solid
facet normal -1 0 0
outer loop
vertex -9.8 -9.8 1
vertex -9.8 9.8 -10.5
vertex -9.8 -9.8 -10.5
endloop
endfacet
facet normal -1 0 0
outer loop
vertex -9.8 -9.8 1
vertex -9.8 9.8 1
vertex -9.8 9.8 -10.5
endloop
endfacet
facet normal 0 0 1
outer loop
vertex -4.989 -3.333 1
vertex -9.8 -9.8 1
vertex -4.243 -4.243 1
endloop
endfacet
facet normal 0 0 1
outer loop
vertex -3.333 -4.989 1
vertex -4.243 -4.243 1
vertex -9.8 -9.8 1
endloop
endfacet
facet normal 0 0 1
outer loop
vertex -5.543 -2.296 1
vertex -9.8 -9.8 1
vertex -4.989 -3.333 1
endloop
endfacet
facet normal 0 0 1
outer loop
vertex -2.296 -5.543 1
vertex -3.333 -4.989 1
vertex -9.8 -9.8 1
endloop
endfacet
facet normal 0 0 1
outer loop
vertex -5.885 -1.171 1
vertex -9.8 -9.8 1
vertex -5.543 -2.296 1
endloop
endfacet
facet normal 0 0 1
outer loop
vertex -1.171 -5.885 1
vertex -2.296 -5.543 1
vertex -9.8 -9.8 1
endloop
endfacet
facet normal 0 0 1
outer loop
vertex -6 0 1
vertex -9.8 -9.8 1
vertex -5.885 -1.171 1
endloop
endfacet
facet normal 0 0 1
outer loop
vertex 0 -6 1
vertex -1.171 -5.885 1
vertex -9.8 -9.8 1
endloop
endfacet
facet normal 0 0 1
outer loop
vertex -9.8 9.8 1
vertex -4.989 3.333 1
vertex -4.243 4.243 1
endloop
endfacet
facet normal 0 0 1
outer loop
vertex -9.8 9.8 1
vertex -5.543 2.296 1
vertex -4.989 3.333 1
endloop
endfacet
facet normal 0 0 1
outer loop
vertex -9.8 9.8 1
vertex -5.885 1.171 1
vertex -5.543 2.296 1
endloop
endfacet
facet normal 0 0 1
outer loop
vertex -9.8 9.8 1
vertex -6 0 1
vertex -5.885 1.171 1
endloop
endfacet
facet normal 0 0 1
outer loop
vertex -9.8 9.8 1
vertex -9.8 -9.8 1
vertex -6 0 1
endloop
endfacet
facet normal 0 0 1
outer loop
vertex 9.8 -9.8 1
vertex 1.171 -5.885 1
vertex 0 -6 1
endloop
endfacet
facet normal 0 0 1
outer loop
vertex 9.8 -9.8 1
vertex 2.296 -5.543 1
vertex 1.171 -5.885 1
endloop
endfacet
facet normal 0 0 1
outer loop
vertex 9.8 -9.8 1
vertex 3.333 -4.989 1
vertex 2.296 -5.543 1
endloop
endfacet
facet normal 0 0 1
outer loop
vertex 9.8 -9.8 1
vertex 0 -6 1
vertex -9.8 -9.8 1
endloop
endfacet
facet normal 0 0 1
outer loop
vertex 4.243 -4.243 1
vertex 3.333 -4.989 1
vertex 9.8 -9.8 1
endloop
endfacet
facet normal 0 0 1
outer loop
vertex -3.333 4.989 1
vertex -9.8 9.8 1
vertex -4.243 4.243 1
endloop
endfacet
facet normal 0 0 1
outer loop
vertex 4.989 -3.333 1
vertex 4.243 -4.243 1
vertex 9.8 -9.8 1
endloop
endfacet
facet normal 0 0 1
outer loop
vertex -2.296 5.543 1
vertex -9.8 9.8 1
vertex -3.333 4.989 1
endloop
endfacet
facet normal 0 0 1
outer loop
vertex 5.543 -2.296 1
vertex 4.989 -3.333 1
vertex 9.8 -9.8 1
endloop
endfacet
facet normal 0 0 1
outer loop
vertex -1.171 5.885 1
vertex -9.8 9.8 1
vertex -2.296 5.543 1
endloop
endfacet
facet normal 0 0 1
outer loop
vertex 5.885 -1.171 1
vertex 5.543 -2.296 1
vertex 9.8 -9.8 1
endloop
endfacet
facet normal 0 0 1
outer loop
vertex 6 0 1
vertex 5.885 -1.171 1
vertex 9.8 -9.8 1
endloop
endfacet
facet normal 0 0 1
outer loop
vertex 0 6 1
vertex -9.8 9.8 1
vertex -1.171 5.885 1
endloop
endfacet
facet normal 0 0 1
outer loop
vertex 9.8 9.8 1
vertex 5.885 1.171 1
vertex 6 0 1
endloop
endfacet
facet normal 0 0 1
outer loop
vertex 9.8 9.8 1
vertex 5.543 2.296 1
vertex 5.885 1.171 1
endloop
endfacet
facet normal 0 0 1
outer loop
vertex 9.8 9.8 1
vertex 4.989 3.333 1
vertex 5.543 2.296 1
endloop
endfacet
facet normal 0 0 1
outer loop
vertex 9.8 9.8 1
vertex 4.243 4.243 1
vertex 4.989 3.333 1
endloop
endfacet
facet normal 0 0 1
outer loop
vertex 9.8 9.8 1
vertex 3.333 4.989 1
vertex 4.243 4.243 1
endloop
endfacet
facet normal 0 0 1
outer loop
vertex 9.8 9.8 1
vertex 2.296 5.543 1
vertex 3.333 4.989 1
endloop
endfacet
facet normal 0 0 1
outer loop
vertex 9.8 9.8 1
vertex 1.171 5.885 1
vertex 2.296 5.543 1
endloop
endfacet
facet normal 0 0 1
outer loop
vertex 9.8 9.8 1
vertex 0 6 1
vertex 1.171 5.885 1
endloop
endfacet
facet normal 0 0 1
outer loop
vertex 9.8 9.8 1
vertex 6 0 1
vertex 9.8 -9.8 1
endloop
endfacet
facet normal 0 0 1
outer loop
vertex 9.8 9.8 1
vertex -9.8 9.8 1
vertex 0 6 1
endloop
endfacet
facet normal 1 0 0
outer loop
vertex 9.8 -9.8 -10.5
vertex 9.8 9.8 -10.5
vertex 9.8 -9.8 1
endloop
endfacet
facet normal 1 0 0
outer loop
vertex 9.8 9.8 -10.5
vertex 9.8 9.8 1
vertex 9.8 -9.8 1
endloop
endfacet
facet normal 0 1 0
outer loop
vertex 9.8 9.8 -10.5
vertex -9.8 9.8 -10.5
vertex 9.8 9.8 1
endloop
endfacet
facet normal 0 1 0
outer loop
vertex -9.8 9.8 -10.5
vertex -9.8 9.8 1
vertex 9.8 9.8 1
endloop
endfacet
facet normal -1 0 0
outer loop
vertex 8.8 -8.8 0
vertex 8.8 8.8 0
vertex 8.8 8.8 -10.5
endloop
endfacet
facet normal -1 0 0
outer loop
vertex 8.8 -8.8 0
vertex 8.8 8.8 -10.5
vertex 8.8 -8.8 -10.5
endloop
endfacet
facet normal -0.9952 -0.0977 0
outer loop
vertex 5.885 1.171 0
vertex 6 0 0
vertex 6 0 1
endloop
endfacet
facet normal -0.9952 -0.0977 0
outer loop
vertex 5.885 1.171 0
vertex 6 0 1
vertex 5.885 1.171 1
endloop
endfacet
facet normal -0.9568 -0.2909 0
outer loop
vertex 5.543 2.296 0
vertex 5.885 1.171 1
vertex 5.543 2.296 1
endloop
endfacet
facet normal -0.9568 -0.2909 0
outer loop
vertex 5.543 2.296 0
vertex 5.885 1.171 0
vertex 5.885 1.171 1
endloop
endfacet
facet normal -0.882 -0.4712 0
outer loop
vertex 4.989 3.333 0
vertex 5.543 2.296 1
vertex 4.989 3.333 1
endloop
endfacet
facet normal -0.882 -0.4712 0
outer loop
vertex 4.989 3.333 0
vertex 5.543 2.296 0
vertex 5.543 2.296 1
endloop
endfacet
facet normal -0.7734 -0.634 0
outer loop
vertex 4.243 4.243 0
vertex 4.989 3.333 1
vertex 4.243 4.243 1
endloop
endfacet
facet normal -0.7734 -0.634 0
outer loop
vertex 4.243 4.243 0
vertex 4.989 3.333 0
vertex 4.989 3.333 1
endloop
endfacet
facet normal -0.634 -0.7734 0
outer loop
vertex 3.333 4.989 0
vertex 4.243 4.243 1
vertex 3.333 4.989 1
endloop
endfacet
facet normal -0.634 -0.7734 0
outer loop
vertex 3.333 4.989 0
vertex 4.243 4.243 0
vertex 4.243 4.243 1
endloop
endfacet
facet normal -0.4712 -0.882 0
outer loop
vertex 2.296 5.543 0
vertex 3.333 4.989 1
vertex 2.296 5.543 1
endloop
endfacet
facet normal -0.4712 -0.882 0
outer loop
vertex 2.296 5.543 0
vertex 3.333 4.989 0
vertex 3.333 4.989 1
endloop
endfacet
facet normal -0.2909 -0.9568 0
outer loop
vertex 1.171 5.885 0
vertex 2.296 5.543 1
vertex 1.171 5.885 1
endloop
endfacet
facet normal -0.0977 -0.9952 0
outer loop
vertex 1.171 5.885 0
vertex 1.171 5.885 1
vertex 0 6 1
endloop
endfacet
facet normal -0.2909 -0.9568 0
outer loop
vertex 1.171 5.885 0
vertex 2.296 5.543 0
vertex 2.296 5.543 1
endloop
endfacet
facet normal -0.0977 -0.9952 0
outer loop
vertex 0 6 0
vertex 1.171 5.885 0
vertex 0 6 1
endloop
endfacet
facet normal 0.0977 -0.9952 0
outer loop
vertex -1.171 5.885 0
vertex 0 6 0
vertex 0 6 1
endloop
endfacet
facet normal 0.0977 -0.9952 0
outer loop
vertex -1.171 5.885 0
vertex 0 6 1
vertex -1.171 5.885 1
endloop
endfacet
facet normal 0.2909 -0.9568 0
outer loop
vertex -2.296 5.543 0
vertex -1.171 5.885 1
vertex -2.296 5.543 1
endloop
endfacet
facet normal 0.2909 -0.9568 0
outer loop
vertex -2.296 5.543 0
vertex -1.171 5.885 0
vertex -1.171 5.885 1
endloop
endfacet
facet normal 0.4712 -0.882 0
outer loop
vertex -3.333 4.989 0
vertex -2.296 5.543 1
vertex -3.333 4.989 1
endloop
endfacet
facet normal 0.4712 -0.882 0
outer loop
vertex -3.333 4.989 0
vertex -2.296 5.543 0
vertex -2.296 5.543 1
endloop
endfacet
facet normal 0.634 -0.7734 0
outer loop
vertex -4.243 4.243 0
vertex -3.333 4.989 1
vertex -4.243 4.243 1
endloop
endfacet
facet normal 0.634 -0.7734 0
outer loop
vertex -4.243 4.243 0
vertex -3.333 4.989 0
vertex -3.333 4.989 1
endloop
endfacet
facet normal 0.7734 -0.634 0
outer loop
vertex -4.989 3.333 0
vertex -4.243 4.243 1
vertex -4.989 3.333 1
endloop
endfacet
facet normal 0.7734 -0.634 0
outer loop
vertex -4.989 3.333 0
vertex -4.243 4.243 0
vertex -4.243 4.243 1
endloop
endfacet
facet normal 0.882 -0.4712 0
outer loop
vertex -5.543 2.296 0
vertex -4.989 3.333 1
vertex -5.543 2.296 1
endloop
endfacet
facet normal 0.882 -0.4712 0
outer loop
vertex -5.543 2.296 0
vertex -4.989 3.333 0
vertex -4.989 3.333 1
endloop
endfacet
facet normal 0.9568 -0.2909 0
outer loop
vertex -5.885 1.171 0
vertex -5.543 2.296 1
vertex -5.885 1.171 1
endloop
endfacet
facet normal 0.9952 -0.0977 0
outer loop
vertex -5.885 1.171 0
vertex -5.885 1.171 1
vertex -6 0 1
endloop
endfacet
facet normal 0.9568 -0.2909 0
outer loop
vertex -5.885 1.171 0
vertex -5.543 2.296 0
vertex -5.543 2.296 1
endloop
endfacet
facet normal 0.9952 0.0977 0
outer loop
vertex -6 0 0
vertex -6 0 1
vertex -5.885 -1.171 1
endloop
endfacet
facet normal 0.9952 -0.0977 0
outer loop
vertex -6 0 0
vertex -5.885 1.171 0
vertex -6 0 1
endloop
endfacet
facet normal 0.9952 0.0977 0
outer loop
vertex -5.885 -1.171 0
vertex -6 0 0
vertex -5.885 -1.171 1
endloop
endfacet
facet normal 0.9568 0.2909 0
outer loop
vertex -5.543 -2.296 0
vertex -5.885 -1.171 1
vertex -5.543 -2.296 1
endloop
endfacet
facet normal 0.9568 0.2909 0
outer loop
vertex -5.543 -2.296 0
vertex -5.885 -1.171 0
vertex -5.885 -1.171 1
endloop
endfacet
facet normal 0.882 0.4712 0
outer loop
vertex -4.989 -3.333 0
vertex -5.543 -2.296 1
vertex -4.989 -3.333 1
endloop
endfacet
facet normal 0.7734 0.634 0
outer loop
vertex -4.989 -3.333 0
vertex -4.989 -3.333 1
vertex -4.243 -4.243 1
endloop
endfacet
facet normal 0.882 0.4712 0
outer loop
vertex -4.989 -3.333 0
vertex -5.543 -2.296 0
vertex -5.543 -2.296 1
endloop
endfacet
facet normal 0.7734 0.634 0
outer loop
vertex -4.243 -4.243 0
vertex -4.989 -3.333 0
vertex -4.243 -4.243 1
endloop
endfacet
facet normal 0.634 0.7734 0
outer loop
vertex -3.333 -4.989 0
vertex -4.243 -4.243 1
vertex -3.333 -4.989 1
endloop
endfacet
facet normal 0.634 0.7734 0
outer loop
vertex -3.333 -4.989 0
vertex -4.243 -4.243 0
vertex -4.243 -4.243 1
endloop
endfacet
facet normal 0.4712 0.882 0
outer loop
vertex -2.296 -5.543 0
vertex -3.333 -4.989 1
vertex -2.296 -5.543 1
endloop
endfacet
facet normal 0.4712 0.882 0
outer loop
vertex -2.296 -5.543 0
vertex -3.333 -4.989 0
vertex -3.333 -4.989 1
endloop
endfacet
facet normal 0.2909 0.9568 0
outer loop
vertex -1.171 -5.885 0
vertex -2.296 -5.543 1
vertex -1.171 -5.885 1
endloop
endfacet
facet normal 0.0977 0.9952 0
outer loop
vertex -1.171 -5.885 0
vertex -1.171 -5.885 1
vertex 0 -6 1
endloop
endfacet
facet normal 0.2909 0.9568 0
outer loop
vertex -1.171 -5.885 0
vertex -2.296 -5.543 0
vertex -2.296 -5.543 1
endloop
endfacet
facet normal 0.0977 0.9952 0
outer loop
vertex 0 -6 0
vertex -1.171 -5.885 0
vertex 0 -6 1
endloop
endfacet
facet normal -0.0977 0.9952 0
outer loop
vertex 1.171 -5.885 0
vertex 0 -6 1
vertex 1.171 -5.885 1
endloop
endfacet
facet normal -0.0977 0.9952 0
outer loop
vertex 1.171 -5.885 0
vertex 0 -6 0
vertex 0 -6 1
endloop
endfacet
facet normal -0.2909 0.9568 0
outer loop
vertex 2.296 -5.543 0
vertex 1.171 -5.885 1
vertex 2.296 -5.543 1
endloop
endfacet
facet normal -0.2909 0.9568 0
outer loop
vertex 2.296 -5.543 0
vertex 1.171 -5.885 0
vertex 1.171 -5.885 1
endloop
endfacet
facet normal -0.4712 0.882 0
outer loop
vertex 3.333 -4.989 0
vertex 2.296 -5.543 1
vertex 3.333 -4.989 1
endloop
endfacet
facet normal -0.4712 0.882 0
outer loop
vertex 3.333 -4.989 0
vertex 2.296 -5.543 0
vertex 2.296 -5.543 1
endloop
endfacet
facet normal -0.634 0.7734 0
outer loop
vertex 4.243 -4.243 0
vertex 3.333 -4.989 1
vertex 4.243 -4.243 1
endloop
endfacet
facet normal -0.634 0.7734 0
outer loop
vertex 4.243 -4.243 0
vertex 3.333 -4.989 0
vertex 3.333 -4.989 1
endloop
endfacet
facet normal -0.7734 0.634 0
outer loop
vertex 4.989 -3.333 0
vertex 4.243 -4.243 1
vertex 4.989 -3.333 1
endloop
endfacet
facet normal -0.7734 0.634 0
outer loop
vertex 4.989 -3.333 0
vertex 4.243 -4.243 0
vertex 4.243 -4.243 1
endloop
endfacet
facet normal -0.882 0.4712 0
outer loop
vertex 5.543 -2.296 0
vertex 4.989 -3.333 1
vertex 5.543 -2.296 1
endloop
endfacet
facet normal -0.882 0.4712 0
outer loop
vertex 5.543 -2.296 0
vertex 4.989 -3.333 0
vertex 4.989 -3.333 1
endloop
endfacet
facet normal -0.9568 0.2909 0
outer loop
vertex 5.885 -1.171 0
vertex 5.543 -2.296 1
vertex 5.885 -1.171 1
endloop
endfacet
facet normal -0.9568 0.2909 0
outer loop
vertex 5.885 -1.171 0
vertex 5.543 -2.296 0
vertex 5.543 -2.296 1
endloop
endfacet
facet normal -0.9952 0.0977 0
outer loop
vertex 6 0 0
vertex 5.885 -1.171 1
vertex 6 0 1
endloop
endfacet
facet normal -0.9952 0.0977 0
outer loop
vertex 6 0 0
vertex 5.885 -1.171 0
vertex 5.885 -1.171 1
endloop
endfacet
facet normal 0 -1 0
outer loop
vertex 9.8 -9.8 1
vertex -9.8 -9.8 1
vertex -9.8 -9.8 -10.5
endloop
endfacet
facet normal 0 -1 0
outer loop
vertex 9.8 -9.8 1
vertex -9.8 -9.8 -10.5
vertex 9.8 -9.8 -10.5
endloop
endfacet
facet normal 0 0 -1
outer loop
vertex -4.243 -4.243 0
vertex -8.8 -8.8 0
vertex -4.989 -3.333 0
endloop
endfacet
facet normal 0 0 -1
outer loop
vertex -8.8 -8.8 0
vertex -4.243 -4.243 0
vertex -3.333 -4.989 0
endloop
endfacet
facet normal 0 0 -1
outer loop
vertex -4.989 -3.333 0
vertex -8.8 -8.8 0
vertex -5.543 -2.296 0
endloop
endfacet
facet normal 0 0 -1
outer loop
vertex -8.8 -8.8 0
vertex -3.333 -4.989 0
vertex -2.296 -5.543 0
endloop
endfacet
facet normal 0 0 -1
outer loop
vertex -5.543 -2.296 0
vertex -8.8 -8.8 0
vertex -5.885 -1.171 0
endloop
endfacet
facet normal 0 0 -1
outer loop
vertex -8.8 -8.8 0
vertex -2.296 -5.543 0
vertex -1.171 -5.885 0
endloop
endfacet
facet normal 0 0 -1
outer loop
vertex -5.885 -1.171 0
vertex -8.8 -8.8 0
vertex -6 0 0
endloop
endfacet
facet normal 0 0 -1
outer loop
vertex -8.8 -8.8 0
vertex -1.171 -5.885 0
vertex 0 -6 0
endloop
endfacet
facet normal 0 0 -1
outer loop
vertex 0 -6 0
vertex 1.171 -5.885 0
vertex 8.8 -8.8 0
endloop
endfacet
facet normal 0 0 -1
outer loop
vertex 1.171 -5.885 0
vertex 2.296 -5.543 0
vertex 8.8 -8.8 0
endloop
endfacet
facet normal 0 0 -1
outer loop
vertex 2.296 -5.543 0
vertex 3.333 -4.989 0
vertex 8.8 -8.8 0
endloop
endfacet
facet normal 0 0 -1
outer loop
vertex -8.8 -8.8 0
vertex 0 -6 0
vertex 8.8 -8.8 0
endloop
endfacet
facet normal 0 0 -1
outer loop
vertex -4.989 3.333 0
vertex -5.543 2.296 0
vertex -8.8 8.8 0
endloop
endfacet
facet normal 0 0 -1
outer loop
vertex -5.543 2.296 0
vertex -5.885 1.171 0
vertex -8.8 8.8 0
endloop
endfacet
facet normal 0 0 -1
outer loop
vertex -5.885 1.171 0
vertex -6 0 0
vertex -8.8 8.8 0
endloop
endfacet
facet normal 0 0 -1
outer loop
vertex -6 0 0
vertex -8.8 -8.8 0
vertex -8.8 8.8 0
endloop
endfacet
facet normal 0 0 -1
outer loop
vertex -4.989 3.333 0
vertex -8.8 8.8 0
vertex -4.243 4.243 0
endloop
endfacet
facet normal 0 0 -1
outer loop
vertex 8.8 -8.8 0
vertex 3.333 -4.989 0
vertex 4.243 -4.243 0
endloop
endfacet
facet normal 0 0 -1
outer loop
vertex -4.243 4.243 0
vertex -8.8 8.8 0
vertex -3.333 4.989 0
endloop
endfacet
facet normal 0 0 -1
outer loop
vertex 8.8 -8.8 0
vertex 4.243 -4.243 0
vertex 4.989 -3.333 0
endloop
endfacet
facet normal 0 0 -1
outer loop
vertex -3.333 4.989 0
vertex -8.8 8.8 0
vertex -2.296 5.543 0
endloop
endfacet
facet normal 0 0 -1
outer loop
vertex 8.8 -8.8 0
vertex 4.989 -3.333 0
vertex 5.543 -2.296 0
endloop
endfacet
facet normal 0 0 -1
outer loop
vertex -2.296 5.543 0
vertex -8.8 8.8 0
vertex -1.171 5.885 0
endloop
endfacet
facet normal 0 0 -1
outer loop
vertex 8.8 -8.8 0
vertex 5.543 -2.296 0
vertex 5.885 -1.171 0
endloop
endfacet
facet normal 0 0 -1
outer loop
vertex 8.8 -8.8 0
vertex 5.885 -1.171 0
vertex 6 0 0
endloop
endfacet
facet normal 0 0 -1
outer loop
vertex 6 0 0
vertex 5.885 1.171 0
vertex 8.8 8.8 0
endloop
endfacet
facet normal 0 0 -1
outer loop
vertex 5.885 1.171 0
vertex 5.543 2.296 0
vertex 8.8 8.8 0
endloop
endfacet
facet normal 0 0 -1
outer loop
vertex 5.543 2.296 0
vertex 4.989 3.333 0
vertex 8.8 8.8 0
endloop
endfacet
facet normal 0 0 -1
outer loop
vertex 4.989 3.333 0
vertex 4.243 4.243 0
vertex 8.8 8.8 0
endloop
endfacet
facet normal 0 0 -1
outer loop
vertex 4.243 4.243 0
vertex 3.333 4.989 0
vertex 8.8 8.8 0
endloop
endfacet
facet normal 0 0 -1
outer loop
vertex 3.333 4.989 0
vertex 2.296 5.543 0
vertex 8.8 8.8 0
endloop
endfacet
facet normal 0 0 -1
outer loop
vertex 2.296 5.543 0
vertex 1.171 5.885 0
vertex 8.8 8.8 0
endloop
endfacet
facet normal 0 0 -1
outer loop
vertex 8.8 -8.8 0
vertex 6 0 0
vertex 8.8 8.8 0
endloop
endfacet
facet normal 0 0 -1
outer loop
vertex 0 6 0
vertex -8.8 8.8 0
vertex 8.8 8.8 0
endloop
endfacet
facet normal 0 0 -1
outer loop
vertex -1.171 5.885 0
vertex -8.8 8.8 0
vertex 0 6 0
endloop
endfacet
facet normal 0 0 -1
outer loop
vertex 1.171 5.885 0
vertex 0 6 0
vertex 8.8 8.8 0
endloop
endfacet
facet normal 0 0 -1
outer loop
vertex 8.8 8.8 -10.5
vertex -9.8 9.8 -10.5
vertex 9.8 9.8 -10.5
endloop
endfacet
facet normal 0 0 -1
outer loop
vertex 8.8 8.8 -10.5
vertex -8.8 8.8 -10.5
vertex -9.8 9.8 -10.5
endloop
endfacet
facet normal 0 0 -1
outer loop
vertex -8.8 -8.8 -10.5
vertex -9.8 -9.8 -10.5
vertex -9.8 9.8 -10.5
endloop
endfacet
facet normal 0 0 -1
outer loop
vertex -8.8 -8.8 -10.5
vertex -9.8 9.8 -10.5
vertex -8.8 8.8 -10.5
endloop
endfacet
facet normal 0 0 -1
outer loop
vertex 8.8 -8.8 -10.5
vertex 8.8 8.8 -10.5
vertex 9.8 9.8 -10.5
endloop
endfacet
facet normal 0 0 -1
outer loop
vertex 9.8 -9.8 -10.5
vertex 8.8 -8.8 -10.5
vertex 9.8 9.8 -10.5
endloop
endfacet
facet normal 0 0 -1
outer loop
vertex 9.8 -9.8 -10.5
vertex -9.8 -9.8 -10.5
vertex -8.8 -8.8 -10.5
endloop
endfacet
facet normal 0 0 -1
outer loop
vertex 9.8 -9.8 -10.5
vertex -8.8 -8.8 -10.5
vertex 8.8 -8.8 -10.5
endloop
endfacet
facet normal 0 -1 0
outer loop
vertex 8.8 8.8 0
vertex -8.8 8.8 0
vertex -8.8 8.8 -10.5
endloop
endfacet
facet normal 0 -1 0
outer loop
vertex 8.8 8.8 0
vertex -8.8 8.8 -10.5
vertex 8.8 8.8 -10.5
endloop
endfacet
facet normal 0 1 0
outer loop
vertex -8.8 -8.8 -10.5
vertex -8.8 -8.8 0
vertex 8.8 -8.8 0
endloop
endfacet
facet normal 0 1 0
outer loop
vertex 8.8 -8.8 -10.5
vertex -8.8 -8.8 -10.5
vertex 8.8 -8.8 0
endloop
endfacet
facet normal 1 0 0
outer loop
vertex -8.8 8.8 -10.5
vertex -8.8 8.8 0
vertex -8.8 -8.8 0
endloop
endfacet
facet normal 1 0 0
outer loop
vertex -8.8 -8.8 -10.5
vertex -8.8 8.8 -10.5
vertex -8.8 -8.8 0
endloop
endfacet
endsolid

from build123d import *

# Parameters (mm, degrees)
F0_W     = 19.6
F0_H     = 19.6
F0_R     = 6
F1_DEPTH = 1
F2_W     = 19.6
F2_H     = 19.6
F2_W_2   = 17.6
F2_H_2   = 17.6
F3_DEPTH = 10.5


with BuildPart() as f1:
    # F0 (on Top) → F1 (new body)
    with BuildSketch(Plane.XY):
        Rectangle(F0_W, F0_H)
        Circle(F0_R, mode=Mode.SUBTRACT)
    extrude(amount=F1_DEPTH)

    # F2 (on face) → F3 (join)
    with BuildSketch(Plane(origin=(0, 0, 0), x_dir=(1, 0, 0), z_dir=(0, 0, -1))):
        Rectangle(F2_W, F2_H)
        Rectangle(F2_W_2, F2_H_2, mode=Mode.SUBTRACT)
    extrude(amount=F3_DEPTH)


solid = f1.part
